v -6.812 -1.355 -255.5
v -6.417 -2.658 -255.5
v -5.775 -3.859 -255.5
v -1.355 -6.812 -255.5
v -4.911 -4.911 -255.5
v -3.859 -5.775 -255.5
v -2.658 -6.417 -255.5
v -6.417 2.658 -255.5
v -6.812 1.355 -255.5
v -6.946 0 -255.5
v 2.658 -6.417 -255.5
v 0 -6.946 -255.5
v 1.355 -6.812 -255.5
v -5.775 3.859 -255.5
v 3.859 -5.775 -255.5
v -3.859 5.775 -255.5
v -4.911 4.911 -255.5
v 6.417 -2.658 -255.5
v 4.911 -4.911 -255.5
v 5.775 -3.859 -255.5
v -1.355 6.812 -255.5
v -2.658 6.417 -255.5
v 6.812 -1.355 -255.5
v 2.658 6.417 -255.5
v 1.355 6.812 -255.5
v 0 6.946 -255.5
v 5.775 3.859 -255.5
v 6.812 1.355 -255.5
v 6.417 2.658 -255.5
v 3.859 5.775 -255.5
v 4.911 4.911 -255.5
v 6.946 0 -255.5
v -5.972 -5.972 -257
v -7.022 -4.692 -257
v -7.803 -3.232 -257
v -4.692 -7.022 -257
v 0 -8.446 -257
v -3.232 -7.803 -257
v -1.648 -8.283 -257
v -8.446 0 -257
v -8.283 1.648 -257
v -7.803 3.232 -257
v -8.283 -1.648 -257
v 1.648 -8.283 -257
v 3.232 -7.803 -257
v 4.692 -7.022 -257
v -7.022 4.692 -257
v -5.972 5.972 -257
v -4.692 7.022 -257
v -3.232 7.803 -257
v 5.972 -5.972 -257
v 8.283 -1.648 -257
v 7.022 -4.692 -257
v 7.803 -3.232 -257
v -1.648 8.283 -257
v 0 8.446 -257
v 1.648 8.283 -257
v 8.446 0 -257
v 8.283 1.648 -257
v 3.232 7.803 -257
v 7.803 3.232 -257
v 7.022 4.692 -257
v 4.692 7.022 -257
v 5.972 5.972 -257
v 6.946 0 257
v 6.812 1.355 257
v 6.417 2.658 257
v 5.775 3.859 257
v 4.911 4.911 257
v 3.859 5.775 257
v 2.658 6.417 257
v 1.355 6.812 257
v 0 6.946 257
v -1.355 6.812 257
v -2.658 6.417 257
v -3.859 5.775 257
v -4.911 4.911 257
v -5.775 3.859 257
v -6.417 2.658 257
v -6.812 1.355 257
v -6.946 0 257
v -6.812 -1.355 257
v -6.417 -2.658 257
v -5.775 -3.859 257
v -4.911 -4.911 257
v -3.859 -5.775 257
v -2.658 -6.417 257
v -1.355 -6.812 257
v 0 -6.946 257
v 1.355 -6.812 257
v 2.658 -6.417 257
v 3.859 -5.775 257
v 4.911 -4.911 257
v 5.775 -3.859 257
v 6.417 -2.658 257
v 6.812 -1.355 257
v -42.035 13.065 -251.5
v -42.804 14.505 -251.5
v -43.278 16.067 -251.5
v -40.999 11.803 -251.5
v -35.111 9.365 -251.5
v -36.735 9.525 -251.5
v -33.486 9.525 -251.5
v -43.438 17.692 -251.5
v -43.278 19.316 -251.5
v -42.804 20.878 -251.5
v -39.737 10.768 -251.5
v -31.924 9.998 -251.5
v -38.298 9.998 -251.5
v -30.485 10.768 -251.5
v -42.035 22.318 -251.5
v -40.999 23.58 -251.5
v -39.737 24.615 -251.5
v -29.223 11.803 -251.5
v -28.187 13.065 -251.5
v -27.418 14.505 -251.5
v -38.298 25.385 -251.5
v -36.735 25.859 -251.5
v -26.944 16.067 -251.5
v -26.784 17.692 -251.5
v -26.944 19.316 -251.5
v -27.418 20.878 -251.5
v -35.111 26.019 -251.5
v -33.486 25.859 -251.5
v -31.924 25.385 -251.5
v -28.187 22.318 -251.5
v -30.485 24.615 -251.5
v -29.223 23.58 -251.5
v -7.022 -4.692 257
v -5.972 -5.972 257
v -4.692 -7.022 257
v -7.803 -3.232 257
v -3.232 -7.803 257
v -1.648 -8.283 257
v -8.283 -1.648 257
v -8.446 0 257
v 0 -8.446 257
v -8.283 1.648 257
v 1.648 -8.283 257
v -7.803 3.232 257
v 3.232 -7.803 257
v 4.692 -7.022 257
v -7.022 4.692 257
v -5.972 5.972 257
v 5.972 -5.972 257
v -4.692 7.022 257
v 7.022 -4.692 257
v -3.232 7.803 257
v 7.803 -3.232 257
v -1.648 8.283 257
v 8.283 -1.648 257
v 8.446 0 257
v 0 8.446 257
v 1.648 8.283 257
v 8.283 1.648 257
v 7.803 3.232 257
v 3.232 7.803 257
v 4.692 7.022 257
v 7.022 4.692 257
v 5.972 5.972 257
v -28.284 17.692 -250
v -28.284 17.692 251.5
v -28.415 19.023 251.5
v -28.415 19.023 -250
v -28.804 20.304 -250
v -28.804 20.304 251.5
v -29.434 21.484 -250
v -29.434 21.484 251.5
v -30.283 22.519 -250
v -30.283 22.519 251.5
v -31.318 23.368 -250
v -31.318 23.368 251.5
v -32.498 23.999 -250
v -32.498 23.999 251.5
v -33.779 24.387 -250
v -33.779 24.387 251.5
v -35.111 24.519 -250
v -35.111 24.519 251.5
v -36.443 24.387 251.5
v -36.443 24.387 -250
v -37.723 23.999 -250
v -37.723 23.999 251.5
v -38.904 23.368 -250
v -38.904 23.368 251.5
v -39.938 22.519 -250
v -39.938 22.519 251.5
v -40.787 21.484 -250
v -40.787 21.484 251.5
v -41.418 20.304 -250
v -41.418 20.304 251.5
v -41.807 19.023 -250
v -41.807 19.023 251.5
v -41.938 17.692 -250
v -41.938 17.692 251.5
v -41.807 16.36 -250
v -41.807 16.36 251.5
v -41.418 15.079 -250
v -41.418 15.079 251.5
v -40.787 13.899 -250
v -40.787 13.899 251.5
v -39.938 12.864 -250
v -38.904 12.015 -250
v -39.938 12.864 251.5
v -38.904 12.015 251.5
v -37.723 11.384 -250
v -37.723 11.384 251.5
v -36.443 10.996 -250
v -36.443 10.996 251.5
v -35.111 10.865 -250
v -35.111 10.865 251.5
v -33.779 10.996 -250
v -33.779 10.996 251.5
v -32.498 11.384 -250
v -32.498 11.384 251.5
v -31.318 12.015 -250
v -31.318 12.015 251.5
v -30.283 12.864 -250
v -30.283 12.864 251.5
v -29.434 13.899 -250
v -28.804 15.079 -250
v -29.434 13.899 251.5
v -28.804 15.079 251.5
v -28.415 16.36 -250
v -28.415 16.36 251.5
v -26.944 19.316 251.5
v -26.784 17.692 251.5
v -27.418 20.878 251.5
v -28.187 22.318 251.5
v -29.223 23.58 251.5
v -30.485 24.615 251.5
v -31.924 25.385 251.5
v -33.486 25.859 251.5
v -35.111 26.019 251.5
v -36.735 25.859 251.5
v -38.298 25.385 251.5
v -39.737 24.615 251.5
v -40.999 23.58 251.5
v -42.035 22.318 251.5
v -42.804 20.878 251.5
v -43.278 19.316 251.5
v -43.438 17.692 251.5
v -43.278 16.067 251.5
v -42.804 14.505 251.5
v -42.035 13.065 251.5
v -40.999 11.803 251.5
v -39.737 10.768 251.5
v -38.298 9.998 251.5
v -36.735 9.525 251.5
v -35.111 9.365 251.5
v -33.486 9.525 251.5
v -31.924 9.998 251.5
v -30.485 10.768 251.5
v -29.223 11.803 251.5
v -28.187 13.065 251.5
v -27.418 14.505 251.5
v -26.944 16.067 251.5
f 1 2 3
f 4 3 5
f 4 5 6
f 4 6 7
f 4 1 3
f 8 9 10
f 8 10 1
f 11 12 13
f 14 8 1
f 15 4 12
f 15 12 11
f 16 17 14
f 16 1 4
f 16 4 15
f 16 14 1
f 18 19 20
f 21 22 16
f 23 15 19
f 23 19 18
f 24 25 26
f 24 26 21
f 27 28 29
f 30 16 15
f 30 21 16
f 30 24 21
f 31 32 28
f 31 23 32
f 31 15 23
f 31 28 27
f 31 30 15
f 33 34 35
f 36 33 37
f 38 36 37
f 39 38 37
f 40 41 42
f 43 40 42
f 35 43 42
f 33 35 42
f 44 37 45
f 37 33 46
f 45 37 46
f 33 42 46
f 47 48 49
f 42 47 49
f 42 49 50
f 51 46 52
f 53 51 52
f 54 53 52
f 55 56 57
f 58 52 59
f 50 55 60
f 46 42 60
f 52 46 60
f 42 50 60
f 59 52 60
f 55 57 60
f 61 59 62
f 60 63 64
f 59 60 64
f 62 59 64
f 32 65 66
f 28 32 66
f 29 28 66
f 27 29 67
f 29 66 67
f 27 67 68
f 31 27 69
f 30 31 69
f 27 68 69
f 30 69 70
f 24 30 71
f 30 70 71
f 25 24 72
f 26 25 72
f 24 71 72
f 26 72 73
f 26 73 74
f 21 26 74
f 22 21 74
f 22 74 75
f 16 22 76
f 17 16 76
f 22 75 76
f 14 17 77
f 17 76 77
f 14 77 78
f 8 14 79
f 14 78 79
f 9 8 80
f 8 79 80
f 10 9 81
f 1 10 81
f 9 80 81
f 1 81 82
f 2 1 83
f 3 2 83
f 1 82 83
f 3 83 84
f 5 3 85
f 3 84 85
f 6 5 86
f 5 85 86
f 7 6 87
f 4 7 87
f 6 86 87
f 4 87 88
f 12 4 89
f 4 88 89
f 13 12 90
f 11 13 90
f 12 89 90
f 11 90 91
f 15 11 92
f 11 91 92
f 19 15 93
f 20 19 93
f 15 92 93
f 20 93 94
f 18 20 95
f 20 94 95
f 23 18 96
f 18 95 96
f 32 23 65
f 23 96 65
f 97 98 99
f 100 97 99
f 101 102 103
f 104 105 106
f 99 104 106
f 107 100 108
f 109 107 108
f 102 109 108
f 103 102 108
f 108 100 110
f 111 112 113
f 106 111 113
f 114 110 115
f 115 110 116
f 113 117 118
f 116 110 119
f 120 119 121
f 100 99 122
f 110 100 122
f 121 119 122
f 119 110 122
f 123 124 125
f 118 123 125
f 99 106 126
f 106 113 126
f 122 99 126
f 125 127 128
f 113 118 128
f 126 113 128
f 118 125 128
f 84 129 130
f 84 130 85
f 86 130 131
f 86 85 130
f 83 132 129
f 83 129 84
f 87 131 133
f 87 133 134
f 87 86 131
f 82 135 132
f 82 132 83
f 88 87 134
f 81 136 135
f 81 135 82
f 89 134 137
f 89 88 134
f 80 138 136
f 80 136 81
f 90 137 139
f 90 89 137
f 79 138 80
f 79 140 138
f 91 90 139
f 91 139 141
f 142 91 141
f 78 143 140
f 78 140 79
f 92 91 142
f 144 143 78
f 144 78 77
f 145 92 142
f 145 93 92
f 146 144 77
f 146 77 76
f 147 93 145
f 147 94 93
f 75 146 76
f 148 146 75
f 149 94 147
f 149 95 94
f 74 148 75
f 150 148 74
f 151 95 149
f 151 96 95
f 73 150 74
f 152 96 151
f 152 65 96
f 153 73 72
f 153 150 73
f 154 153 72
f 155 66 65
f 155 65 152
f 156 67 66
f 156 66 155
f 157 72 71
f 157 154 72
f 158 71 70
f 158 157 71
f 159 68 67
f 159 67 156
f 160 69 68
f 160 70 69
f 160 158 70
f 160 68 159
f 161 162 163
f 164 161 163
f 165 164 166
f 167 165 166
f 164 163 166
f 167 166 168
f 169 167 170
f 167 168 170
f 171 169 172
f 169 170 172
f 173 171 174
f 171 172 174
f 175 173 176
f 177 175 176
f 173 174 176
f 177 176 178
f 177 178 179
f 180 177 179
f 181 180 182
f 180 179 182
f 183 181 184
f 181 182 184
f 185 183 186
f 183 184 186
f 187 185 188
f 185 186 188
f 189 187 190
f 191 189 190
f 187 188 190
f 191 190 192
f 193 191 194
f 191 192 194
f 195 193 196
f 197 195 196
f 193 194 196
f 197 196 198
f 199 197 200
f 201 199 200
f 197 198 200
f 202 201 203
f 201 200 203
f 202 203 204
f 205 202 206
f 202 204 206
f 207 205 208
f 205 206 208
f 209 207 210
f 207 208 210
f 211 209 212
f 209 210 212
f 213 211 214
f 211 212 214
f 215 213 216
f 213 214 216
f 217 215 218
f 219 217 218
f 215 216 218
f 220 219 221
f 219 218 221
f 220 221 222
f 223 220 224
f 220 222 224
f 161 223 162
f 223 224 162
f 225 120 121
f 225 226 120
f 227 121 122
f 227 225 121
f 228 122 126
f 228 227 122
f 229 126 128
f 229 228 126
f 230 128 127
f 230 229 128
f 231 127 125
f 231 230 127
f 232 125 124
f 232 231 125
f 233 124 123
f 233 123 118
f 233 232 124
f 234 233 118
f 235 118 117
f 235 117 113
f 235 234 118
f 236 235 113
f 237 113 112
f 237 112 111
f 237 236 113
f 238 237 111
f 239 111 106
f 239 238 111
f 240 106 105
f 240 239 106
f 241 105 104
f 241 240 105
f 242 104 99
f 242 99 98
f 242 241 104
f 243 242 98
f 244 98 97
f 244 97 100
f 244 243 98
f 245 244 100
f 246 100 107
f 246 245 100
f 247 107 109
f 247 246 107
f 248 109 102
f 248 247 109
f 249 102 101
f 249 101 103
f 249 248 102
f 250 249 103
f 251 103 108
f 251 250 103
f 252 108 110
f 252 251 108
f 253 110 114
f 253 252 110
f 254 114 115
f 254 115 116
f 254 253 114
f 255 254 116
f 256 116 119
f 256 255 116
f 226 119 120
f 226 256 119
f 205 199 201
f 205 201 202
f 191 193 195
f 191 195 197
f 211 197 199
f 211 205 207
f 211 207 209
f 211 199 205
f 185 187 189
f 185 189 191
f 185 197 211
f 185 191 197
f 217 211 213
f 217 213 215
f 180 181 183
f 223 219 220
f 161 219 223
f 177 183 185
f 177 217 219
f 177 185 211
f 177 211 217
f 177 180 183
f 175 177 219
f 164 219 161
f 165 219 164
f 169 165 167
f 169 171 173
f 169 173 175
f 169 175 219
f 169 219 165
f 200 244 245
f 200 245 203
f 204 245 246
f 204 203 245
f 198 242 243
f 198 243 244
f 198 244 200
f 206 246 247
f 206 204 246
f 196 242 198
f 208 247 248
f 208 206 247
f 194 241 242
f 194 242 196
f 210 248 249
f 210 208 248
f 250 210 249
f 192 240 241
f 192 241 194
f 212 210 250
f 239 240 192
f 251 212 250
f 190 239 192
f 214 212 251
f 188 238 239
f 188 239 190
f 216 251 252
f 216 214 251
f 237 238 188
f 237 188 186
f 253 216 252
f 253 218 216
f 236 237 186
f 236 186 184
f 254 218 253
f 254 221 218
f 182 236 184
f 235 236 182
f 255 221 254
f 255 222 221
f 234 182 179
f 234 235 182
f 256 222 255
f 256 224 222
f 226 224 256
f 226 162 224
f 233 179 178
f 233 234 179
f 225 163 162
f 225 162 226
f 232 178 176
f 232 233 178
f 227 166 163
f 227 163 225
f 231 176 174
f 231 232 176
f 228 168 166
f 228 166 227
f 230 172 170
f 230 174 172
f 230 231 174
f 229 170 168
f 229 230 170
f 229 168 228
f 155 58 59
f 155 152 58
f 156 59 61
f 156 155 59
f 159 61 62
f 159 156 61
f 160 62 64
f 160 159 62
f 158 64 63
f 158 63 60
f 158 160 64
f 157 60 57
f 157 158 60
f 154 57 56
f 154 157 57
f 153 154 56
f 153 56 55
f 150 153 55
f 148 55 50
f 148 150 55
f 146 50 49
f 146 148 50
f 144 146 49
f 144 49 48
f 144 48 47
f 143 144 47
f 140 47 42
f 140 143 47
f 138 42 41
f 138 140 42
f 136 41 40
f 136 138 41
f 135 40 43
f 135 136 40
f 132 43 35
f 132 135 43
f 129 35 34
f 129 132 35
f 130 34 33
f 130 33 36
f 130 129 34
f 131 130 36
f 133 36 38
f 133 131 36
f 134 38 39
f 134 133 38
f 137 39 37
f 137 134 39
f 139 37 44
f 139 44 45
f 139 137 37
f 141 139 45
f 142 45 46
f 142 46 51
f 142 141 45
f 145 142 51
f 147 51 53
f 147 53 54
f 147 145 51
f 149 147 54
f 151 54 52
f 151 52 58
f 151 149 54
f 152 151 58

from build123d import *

# Parameters (mm, degrees)
F0_R     = 8.445656
F1_DEPTH = 257
F2_R     = 8.327026
F3_DEPTH = 251.5
F4_T     = -1.5
F4_2_T   = -1.5


with BuildPart() as f1:
    # F0 (on Top) → F1 (new body, symmetric)
    with BuildSketch(Plane.XY):
        Circle(F0_R)
    extrude(amount=F1_DEPTH, both=True)

    # F4#2
    f4_2_openings = [f1.faces().sort_by_distance(p)[0] for p in [
        (0, 0, 257),
    ]]
    offset(amount=F4_2_T, openings=f4_2_openings)


with BuildPart() as f3:
    # F2 (on Top) → F3 (new body, symmetric)
    with BuildSketch(Plane.XY):
        with Locations((-35.110887, 17.691532)):
            Circle(F2_R)
    extrude(amount=F3_DEPTH, both=True)

    # F4
    f4_openings = [f3.faces().sort_by_distance(p)[0] for p in [
        (-35.110887, 17.691532, 251.5),
    ]]
    offset(amount=F4_T, openings=f4_openings)


solid = Compound([f1.part, f3.part])
